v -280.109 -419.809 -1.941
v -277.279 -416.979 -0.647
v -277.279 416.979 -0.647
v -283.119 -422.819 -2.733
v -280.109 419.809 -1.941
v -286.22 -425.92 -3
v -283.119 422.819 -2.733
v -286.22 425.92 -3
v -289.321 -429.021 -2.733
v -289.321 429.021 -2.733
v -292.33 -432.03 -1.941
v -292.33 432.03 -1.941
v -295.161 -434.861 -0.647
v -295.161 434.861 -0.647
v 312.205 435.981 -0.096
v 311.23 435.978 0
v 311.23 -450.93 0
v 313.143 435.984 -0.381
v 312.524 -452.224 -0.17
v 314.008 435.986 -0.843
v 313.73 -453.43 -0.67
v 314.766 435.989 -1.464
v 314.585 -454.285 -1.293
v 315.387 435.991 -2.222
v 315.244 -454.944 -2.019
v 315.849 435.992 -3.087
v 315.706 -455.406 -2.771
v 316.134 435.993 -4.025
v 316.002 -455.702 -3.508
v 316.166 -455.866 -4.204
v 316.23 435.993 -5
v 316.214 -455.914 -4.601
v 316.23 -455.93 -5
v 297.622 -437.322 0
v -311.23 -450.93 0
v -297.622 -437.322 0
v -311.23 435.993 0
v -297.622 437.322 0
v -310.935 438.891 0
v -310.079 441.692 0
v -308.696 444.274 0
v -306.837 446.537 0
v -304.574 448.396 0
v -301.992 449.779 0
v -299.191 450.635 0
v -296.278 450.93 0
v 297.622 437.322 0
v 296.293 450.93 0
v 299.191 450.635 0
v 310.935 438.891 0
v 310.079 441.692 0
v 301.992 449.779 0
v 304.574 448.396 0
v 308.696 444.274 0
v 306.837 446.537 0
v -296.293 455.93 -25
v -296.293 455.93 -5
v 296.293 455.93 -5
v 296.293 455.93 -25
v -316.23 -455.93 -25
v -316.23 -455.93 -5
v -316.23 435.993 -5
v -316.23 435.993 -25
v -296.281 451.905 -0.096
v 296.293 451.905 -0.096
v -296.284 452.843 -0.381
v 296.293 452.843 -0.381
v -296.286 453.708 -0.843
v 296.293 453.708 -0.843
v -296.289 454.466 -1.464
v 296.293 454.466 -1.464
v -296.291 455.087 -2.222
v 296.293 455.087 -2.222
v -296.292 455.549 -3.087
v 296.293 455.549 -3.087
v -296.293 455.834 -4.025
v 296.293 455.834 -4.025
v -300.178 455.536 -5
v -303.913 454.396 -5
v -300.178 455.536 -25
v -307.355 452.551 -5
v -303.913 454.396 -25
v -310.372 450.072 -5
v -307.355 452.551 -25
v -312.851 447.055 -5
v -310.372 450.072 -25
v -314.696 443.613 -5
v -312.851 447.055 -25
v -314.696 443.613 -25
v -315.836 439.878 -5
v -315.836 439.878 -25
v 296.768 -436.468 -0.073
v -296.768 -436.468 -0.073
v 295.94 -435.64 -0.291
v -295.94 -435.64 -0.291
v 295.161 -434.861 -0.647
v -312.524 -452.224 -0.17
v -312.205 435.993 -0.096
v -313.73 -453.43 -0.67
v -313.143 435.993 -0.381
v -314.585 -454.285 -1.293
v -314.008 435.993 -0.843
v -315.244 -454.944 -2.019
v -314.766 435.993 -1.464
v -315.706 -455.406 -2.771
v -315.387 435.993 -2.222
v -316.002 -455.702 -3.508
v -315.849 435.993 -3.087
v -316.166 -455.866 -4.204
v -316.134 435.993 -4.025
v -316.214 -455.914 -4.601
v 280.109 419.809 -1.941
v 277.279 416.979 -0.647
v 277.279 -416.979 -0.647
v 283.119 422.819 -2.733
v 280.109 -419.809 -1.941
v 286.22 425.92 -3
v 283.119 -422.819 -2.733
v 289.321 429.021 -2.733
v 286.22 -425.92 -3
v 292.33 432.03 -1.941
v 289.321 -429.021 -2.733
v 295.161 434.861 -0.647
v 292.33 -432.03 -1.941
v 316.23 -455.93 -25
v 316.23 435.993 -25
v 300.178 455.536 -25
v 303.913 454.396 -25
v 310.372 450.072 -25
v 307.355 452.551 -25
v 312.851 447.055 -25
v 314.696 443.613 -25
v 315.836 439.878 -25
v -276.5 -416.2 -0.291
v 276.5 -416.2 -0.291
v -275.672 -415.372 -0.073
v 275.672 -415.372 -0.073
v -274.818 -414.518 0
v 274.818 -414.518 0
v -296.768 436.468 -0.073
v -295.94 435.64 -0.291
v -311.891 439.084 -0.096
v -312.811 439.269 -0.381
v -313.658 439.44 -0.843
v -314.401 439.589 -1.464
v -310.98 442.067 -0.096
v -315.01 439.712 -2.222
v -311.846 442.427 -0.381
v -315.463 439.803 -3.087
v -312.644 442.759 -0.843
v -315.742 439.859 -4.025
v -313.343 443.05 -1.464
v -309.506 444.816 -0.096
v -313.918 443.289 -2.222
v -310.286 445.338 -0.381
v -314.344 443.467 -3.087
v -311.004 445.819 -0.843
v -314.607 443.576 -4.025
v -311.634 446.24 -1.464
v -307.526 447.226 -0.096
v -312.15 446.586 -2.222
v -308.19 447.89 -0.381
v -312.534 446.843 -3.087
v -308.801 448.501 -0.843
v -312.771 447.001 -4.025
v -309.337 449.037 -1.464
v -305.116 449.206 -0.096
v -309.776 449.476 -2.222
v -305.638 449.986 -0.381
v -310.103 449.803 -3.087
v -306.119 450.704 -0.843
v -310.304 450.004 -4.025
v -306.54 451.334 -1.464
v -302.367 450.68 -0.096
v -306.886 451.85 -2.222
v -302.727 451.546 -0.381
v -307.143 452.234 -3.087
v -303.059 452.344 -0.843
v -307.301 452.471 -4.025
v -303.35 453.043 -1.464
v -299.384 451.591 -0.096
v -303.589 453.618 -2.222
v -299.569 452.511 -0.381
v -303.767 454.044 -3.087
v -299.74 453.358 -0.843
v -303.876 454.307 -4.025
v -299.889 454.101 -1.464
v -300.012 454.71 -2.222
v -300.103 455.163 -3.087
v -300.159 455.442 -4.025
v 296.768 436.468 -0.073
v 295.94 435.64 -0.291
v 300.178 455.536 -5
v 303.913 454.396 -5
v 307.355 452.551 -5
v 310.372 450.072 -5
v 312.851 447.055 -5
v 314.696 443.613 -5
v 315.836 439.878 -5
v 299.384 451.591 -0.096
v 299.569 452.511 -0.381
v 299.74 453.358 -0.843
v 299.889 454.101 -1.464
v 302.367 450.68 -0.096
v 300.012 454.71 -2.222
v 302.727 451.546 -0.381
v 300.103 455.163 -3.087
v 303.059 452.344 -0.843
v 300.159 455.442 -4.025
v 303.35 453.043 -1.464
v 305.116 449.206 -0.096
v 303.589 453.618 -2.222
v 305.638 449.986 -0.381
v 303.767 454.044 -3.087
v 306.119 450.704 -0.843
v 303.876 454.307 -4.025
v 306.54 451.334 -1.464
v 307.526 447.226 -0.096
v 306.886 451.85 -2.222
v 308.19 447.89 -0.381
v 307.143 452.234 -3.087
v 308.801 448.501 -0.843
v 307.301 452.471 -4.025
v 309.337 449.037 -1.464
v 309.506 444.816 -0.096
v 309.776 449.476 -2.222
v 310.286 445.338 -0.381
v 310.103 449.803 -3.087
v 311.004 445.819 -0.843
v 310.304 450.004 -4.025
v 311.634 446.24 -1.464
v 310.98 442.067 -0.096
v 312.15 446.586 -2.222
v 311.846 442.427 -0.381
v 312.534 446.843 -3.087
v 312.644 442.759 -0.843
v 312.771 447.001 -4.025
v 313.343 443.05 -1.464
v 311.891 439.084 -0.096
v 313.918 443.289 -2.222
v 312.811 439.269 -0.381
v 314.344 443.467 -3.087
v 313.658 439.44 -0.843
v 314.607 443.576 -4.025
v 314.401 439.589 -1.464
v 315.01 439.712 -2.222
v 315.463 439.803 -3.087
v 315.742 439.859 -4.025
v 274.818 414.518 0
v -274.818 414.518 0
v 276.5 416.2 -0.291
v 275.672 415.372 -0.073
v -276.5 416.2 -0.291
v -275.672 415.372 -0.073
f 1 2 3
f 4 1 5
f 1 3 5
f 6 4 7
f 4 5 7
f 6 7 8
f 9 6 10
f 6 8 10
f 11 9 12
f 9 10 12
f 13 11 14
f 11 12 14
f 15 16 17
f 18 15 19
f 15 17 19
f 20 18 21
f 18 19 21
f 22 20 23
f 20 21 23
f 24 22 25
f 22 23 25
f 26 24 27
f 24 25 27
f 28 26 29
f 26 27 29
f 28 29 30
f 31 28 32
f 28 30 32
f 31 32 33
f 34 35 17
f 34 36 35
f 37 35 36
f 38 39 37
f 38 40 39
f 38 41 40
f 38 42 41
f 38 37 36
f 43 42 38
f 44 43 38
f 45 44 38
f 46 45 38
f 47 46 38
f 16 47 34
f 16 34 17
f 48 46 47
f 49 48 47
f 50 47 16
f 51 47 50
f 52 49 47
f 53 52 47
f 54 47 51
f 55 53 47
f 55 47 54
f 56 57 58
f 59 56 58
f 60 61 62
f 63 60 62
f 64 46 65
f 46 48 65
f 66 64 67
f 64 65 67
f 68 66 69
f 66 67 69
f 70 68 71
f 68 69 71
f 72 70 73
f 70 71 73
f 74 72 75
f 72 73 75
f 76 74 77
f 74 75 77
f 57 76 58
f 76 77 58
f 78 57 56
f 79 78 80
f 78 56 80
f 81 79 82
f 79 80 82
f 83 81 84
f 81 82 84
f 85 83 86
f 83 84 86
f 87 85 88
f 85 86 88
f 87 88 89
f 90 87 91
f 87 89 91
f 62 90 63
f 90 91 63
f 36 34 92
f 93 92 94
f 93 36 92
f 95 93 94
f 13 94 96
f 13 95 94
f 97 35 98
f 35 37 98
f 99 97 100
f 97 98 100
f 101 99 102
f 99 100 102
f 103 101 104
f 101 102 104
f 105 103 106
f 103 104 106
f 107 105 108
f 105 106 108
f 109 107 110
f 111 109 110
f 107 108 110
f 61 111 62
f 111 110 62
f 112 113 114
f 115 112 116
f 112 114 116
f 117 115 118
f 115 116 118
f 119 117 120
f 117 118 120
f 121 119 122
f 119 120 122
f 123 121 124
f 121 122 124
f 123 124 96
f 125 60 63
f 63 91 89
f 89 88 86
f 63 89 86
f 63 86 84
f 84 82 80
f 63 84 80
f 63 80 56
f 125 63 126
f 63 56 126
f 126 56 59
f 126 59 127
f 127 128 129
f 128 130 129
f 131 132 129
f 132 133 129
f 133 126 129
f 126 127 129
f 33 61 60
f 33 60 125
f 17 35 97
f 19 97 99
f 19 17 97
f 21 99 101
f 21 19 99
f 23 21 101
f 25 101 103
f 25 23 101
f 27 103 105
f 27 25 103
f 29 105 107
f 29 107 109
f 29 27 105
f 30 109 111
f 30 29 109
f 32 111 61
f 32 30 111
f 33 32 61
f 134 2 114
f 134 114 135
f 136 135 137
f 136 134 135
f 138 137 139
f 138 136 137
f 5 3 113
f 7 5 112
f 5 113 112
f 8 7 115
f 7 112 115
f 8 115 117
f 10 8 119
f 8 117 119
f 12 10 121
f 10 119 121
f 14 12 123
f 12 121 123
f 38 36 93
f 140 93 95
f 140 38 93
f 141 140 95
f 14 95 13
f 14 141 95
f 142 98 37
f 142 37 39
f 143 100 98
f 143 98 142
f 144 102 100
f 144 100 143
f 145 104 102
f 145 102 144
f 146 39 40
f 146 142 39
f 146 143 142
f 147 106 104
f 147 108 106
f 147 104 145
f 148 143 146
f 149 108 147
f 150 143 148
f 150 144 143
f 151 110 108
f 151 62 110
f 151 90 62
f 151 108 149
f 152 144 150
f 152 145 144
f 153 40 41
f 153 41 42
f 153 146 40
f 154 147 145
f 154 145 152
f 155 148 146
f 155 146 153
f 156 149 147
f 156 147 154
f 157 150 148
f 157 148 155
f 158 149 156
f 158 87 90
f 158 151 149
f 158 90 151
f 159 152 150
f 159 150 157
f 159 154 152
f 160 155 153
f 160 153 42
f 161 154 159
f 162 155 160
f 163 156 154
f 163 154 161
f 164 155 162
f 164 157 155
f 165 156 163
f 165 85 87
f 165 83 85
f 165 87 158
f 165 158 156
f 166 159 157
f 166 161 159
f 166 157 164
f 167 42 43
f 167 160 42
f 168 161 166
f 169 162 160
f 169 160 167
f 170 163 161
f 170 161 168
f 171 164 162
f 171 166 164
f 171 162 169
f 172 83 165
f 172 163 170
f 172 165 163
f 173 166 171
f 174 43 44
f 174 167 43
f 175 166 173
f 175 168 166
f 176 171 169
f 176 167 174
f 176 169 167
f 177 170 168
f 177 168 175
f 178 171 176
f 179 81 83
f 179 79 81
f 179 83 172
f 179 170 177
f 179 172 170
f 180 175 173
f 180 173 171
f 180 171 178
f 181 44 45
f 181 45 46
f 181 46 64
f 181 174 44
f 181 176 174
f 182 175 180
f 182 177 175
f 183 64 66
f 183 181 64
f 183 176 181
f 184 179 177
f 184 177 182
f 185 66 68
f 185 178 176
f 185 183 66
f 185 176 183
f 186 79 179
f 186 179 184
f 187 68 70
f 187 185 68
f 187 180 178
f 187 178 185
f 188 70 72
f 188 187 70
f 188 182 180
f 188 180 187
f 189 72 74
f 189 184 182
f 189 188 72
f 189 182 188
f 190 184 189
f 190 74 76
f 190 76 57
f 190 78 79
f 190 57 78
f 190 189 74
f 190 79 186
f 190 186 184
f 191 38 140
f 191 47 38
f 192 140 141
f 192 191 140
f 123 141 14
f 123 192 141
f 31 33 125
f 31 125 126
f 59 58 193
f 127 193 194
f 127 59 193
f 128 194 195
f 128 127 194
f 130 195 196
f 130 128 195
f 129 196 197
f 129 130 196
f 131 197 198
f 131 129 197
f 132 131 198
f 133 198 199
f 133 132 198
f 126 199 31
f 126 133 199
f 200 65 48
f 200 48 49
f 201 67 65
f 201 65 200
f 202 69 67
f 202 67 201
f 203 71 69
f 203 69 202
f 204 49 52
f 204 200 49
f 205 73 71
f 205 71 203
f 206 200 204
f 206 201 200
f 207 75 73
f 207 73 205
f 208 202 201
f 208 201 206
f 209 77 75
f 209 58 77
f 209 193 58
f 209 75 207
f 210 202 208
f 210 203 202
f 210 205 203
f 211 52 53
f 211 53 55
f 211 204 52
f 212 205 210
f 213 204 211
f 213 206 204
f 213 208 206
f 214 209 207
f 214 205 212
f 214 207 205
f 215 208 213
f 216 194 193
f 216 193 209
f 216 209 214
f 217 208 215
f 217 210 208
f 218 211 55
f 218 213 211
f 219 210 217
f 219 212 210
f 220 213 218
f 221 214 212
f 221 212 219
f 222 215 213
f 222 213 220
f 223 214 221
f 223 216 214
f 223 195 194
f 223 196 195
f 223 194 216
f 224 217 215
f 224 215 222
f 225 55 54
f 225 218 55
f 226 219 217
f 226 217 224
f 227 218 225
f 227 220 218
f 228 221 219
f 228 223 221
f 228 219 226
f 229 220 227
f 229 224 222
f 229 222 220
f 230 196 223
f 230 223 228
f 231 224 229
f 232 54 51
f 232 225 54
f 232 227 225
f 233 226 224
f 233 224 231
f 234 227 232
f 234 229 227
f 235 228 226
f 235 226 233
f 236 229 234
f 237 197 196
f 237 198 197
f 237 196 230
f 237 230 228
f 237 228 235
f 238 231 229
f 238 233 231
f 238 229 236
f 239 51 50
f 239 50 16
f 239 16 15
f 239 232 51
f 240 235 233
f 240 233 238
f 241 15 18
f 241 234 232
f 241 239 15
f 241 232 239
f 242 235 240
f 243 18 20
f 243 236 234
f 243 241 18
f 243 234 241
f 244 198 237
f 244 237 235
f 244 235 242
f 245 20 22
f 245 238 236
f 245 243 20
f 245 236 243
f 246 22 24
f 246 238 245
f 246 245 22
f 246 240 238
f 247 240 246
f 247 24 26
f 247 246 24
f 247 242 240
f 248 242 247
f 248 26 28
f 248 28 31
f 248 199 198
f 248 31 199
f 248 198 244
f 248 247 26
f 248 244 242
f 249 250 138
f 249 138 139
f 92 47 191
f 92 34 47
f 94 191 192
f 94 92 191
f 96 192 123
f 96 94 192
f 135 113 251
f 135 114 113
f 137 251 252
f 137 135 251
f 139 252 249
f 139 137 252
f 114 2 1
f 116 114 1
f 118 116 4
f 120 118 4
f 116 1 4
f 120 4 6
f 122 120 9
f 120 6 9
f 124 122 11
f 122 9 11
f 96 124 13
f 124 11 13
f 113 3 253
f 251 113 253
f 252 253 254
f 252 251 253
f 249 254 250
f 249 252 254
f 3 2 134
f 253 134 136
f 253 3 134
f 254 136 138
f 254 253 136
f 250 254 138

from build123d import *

# Parameters (mm, degrees)
F0_W        = 632.46
F0_H        = 911.86
F1_DEPTH    = 25
F3_R        = 18.1666666667
F6_T1_DEPTH = 124.9995000013
F7_R        = 5


# Not quite as in the source:
# - a fillet or chamfer that OpenCascade refuses, or shapes differently, is made with other operations: its cross-section is extruded or revolved along the edge and cut away or added


with BuildPart() as f1:
    # F0 (on Top) → F1 (new body)
    with BuildSketch(Plane.XY):
        Rectangle(F0_W, F0_H)
    extrude(amount=-F1_DEPTH)


with BuildPart() as f4:
    # F4: sweep along a path in F2
    with BuildLine(Plane.XY) as f4_path:
        Line((-286.2199, 425.9199), (286.2199, 425.9199))
        Line((286.2199, 425.9199), (286.2199, -425.9199))
        Line((286.2199, -425.9199), (-286.2199, -425.9199))
        Line((-286.2199, -425.9199), (-286.2199, 425.9199))
    # F3 (on Front) → F4 (sweep)
    with BuildSketch(Plane.XZ):
        with Locations((286.2199, 15.1666666667)):
            Circle(F3_R)
    sweep(path=f4_path.line, transition=Transition.RIGHT)


with BuildPart() as f1_1:
    add(f1.part)

    # F5: cut F4
    add(f4.part, mode=Mode.SUBTRACT)

    # F6: fillet of radius 20 on 2 edges, made by hand

    # F6_s2 → F6_t1 (cut)
    with BuildSketch(Plane.XY.offset(-74.9997500006)):
        with BuildLine():
            ThreePointArc((296.2301, 455.9301), (310.3722356237, 450.0722356237), (316.2301, 435.9301))
            Line((316.2301, 435.9301), (316.6301, 435.9301))
            ThreePointArc((316.6301, 435.9301), (316.63, 445.93005), (316.63, 455.93))
            Line((316.63, 455.93), (316.23, 456.33))
            ThreePointArc((316.23, 456.33), (306.23005, 456.33), (296.2301, 456.3301))
            Line((296.2301, 456.3301), (296.2301, 455.9301))
        make_face()
        with BuildLine():
            ThreePointArc((-296.2301, 455.9301), (-310.3722356237, 450.0722356237), (-316.2301, 435.9301))
            Line((-316.2301, 435.9301), (-316.6301, 435.9301))
            ThreePointArc((-316.6301, 435.9301), (-316.63, 445.93005), (-316.63, 455.93))
            Line((-316.63, 455.93), (-316.23, 456.33))
            ThreePointArc((-316.23, 456.33), (-306.23005, 456.33), (-296.2301, 456.3301))
            Line((-296.2301, 456.3301), (-296.2301, 455.9301))
        make_face()
    extrude(amount=F6_T1_DEPTH, mode=Mode.SUBTRACT)

    # F7
    f7_edges = [f1_1.edges().sort_by_distance(p)[0] for p in [
        (0, 415.9199, 0),
        (276.2199, 0, 0),
        (0, -415.9199, 0),
        (-276.2199, 0, 0),
        (0, 455.93, 0),
        (-310.372236, 450.072236, 0),
        (-316.23, -9.968327, 0),
        (310.372236, 450.072236, 0),
        (316.23, -9.968327, 0),
        (0, -455.93, 0),
        (-296.2199, 0, 0),
        (0, -435.9199, 0),
        (0, 435.9199, 0),
        (296.2199, 0, 0),
    ]]
    fillet(f7_edges, radius=F7_R)


solid = f1_1.part
